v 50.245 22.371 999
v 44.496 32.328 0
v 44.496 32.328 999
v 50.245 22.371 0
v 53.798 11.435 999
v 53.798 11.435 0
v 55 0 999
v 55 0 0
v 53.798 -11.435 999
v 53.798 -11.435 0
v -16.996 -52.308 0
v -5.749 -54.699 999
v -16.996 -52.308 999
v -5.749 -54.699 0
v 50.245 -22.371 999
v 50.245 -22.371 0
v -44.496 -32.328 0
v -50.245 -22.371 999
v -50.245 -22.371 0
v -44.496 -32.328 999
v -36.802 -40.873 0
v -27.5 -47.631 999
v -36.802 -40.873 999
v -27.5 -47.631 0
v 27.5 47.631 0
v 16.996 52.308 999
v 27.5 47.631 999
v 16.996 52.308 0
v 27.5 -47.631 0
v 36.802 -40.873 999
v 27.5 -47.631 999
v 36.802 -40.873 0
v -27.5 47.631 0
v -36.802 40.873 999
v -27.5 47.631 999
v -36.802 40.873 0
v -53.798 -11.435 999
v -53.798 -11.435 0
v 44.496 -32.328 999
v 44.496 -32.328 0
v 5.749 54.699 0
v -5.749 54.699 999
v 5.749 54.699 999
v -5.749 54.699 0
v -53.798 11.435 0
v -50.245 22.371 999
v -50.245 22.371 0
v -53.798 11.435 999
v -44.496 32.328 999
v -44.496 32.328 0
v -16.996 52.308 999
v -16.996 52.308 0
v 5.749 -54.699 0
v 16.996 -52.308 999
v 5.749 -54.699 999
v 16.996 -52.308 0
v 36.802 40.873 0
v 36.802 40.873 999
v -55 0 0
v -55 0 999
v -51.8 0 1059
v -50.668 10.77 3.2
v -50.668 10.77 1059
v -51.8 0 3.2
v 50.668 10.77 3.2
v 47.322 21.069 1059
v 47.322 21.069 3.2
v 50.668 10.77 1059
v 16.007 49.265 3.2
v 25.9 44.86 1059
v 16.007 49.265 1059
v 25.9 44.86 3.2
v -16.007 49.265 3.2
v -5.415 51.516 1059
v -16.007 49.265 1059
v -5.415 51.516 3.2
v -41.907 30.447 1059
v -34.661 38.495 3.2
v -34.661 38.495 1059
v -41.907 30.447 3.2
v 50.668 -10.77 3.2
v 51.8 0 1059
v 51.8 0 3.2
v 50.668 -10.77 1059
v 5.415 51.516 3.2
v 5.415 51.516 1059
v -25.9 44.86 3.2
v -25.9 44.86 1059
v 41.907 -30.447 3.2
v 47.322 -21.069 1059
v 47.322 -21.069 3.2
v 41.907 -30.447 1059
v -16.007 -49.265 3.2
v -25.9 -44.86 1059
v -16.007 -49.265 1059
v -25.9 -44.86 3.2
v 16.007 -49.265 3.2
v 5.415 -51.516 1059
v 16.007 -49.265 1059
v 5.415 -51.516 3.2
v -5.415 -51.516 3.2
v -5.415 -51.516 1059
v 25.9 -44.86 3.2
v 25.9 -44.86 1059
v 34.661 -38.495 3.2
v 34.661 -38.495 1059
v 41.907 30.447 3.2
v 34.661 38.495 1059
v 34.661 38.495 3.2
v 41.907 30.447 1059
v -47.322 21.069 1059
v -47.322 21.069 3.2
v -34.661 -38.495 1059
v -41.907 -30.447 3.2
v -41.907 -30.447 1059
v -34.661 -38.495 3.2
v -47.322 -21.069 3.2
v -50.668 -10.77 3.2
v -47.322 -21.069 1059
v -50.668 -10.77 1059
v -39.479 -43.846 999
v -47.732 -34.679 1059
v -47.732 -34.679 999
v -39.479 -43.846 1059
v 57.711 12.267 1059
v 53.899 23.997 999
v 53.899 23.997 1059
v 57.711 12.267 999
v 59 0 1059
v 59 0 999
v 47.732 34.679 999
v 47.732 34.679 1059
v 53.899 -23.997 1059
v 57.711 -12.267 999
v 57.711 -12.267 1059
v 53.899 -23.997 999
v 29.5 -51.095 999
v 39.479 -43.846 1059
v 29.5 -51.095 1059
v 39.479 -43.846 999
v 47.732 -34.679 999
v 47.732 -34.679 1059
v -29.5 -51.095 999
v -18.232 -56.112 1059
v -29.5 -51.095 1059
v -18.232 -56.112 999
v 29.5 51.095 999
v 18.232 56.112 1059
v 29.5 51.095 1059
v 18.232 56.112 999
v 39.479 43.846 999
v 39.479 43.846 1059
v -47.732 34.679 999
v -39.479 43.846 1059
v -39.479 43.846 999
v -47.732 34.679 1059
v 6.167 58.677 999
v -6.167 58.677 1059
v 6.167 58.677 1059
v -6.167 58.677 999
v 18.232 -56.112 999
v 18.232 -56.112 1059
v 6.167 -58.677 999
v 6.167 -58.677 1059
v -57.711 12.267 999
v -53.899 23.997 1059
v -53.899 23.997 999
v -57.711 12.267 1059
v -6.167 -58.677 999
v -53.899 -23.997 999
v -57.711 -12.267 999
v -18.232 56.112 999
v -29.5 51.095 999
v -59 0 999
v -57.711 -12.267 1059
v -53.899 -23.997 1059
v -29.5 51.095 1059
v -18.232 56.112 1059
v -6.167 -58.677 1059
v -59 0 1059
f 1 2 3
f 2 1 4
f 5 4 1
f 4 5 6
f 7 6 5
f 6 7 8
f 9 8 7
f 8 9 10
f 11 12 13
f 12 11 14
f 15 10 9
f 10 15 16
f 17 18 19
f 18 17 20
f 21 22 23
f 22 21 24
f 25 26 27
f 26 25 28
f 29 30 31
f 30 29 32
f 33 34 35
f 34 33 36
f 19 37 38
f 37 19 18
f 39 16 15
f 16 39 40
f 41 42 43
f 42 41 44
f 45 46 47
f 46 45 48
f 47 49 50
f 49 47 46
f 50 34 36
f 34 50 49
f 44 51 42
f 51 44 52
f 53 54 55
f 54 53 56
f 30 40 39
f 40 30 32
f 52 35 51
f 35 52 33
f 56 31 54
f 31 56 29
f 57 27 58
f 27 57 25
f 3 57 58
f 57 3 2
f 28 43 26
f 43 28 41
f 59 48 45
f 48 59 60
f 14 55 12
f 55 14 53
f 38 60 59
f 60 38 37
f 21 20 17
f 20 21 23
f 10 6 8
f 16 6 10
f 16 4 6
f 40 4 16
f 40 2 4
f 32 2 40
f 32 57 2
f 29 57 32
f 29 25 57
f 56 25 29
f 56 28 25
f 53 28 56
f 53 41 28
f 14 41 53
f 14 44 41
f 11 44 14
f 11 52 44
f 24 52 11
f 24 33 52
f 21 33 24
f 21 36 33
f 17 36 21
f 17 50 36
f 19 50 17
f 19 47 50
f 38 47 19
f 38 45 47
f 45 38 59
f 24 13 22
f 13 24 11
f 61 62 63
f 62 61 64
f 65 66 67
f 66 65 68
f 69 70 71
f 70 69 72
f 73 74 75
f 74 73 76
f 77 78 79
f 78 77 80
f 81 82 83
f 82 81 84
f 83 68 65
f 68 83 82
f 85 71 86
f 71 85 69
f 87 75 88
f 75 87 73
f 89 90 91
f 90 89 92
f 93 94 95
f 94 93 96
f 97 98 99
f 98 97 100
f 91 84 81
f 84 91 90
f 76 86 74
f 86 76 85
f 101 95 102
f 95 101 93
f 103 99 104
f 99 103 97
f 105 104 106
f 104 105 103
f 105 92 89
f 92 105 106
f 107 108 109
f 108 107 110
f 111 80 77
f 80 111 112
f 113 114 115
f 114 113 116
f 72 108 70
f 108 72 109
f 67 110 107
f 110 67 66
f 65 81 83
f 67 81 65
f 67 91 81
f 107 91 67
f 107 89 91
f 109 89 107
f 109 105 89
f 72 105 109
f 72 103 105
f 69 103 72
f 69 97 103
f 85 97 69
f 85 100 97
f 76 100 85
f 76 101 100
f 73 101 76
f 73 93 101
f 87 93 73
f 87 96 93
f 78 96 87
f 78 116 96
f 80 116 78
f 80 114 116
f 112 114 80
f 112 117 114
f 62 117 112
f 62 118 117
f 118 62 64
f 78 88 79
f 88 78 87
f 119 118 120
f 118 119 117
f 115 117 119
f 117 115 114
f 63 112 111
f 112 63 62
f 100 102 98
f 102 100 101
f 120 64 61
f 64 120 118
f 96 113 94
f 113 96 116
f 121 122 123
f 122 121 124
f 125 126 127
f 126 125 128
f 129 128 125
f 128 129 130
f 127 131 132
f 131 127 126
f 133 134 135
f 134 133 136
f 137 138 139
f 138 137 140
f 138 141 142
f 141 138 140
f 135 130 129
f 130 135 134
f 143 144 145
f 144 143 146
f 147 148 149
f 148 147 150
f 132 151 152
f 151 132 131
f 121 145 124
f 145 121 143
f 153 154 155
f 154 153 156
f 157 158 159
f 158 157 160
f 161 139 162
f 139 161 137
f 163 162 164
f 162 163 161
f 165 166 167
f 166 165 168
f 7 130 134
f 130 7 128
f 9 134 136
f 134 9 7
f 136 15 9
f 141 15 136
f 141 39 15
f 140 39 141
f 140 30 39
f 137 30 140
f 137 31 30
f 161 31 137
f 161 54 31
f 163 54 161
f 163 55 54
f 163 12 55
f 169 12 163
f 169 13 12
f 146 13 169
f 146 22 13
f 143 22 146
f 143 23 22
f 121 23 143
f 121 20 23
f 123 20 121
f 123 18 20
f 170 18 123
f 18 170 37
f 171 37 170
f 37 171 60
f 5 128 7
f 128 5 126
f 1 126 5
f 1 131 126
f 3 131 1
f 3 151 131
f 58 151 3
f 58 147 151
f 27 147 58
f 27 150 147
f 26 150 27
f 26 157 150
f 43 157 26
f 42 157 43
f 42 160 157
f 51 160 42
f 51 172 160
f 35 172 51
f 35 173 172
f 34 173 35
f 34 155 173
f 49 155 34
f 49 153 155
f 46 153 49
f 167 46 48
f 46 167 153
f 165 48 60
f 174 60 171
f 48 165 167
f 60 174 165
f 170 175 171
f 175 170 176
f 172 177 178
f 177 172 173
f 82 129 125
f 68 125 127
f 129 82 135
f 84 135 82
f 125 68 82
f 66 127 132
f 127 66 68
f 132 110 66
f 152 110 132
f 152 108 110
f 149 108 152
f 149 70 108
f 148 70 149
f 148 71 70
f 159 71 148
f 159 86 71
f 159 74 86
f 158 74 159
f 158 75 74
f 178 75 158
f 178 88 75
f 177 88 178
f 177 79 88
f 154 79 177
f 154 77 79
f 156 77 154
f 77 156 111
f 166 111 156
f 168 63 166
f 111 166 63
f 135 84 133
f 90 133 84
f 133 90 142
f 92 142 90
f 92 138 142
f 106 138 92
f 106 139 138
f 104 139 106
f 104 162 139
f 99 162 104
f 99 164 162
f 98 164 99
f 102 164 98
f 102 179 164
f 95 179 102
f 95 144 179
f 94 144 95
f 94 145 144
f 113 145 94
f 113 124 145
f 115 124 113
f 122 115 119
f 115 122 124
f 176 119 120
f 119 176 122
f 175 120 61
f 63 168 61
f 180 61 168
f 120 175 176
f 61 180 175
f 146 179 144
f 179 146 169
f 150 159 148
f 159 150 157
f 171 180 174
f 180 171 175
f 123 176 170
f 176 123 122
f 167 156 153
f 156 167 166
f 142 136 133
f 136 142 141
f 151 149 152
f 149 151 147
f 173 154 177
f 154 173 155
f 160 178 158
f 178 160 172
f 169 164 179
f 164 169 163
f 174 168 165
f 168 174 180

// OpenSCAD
// Parameters
nominal_diameter_mm = 110; //[55:220:1]
length_mm = 1000; //[500:2000:10]
wall_thickness_mm = 3.2; //[1.6:6.4:0.1]
fitting_length_mm = 60; //[30:120:1]
fitting_radial_increase_mm = 4; //[2:10:0.5]
fitting_wall_extra_mm = 0.8; //[0.2:2.0:0.1]
connection_overlap_mm = 1; //[0.5:2:0.1]

// HT Pipe - complete geometry
module ht_pipe() {
  color([0.85, 0.85, 0.8]) { // PVC color
    union() {
      // Pipe body
      difference() {
        cylinder(r=nominal_diameter_mm/2, h=length_mm, center=false);
        translate([0, 0, wall_thickness_mm])
          cylinder(r=nominal_diameter_mm/2 - wall_thickness_mm, h=length_mm, center=false);
      }
      
      // End fitting
      difference() {
        translate([0, 0, length_mm - connection_overlap_mm])
          cylinder(r=nominal_diameter_mm/2 + fitting_radial_increase_mm, h=fitting_length_mm, center=false);
        translate([0, 0, length_mm - connection_overlap_mm])
          cylinder(r=nominal_diameter_mm/2 - wall_thickness_mm, h=fitting_length_mm, center=false);
        translate([0, 0, length_mm - connection_overlap_mm + wall_thickness_mm])
          cylinder(r=nominal_diameter_mm/2 - (wall_thickness_mm + fitting_wall_extra_mm), h=fitting_length_mm - wall_thickness_mm, center=false);
      }
    }
  }
}

// Assembly
module assembly() {
  ht_pipe();
}

assembly();
